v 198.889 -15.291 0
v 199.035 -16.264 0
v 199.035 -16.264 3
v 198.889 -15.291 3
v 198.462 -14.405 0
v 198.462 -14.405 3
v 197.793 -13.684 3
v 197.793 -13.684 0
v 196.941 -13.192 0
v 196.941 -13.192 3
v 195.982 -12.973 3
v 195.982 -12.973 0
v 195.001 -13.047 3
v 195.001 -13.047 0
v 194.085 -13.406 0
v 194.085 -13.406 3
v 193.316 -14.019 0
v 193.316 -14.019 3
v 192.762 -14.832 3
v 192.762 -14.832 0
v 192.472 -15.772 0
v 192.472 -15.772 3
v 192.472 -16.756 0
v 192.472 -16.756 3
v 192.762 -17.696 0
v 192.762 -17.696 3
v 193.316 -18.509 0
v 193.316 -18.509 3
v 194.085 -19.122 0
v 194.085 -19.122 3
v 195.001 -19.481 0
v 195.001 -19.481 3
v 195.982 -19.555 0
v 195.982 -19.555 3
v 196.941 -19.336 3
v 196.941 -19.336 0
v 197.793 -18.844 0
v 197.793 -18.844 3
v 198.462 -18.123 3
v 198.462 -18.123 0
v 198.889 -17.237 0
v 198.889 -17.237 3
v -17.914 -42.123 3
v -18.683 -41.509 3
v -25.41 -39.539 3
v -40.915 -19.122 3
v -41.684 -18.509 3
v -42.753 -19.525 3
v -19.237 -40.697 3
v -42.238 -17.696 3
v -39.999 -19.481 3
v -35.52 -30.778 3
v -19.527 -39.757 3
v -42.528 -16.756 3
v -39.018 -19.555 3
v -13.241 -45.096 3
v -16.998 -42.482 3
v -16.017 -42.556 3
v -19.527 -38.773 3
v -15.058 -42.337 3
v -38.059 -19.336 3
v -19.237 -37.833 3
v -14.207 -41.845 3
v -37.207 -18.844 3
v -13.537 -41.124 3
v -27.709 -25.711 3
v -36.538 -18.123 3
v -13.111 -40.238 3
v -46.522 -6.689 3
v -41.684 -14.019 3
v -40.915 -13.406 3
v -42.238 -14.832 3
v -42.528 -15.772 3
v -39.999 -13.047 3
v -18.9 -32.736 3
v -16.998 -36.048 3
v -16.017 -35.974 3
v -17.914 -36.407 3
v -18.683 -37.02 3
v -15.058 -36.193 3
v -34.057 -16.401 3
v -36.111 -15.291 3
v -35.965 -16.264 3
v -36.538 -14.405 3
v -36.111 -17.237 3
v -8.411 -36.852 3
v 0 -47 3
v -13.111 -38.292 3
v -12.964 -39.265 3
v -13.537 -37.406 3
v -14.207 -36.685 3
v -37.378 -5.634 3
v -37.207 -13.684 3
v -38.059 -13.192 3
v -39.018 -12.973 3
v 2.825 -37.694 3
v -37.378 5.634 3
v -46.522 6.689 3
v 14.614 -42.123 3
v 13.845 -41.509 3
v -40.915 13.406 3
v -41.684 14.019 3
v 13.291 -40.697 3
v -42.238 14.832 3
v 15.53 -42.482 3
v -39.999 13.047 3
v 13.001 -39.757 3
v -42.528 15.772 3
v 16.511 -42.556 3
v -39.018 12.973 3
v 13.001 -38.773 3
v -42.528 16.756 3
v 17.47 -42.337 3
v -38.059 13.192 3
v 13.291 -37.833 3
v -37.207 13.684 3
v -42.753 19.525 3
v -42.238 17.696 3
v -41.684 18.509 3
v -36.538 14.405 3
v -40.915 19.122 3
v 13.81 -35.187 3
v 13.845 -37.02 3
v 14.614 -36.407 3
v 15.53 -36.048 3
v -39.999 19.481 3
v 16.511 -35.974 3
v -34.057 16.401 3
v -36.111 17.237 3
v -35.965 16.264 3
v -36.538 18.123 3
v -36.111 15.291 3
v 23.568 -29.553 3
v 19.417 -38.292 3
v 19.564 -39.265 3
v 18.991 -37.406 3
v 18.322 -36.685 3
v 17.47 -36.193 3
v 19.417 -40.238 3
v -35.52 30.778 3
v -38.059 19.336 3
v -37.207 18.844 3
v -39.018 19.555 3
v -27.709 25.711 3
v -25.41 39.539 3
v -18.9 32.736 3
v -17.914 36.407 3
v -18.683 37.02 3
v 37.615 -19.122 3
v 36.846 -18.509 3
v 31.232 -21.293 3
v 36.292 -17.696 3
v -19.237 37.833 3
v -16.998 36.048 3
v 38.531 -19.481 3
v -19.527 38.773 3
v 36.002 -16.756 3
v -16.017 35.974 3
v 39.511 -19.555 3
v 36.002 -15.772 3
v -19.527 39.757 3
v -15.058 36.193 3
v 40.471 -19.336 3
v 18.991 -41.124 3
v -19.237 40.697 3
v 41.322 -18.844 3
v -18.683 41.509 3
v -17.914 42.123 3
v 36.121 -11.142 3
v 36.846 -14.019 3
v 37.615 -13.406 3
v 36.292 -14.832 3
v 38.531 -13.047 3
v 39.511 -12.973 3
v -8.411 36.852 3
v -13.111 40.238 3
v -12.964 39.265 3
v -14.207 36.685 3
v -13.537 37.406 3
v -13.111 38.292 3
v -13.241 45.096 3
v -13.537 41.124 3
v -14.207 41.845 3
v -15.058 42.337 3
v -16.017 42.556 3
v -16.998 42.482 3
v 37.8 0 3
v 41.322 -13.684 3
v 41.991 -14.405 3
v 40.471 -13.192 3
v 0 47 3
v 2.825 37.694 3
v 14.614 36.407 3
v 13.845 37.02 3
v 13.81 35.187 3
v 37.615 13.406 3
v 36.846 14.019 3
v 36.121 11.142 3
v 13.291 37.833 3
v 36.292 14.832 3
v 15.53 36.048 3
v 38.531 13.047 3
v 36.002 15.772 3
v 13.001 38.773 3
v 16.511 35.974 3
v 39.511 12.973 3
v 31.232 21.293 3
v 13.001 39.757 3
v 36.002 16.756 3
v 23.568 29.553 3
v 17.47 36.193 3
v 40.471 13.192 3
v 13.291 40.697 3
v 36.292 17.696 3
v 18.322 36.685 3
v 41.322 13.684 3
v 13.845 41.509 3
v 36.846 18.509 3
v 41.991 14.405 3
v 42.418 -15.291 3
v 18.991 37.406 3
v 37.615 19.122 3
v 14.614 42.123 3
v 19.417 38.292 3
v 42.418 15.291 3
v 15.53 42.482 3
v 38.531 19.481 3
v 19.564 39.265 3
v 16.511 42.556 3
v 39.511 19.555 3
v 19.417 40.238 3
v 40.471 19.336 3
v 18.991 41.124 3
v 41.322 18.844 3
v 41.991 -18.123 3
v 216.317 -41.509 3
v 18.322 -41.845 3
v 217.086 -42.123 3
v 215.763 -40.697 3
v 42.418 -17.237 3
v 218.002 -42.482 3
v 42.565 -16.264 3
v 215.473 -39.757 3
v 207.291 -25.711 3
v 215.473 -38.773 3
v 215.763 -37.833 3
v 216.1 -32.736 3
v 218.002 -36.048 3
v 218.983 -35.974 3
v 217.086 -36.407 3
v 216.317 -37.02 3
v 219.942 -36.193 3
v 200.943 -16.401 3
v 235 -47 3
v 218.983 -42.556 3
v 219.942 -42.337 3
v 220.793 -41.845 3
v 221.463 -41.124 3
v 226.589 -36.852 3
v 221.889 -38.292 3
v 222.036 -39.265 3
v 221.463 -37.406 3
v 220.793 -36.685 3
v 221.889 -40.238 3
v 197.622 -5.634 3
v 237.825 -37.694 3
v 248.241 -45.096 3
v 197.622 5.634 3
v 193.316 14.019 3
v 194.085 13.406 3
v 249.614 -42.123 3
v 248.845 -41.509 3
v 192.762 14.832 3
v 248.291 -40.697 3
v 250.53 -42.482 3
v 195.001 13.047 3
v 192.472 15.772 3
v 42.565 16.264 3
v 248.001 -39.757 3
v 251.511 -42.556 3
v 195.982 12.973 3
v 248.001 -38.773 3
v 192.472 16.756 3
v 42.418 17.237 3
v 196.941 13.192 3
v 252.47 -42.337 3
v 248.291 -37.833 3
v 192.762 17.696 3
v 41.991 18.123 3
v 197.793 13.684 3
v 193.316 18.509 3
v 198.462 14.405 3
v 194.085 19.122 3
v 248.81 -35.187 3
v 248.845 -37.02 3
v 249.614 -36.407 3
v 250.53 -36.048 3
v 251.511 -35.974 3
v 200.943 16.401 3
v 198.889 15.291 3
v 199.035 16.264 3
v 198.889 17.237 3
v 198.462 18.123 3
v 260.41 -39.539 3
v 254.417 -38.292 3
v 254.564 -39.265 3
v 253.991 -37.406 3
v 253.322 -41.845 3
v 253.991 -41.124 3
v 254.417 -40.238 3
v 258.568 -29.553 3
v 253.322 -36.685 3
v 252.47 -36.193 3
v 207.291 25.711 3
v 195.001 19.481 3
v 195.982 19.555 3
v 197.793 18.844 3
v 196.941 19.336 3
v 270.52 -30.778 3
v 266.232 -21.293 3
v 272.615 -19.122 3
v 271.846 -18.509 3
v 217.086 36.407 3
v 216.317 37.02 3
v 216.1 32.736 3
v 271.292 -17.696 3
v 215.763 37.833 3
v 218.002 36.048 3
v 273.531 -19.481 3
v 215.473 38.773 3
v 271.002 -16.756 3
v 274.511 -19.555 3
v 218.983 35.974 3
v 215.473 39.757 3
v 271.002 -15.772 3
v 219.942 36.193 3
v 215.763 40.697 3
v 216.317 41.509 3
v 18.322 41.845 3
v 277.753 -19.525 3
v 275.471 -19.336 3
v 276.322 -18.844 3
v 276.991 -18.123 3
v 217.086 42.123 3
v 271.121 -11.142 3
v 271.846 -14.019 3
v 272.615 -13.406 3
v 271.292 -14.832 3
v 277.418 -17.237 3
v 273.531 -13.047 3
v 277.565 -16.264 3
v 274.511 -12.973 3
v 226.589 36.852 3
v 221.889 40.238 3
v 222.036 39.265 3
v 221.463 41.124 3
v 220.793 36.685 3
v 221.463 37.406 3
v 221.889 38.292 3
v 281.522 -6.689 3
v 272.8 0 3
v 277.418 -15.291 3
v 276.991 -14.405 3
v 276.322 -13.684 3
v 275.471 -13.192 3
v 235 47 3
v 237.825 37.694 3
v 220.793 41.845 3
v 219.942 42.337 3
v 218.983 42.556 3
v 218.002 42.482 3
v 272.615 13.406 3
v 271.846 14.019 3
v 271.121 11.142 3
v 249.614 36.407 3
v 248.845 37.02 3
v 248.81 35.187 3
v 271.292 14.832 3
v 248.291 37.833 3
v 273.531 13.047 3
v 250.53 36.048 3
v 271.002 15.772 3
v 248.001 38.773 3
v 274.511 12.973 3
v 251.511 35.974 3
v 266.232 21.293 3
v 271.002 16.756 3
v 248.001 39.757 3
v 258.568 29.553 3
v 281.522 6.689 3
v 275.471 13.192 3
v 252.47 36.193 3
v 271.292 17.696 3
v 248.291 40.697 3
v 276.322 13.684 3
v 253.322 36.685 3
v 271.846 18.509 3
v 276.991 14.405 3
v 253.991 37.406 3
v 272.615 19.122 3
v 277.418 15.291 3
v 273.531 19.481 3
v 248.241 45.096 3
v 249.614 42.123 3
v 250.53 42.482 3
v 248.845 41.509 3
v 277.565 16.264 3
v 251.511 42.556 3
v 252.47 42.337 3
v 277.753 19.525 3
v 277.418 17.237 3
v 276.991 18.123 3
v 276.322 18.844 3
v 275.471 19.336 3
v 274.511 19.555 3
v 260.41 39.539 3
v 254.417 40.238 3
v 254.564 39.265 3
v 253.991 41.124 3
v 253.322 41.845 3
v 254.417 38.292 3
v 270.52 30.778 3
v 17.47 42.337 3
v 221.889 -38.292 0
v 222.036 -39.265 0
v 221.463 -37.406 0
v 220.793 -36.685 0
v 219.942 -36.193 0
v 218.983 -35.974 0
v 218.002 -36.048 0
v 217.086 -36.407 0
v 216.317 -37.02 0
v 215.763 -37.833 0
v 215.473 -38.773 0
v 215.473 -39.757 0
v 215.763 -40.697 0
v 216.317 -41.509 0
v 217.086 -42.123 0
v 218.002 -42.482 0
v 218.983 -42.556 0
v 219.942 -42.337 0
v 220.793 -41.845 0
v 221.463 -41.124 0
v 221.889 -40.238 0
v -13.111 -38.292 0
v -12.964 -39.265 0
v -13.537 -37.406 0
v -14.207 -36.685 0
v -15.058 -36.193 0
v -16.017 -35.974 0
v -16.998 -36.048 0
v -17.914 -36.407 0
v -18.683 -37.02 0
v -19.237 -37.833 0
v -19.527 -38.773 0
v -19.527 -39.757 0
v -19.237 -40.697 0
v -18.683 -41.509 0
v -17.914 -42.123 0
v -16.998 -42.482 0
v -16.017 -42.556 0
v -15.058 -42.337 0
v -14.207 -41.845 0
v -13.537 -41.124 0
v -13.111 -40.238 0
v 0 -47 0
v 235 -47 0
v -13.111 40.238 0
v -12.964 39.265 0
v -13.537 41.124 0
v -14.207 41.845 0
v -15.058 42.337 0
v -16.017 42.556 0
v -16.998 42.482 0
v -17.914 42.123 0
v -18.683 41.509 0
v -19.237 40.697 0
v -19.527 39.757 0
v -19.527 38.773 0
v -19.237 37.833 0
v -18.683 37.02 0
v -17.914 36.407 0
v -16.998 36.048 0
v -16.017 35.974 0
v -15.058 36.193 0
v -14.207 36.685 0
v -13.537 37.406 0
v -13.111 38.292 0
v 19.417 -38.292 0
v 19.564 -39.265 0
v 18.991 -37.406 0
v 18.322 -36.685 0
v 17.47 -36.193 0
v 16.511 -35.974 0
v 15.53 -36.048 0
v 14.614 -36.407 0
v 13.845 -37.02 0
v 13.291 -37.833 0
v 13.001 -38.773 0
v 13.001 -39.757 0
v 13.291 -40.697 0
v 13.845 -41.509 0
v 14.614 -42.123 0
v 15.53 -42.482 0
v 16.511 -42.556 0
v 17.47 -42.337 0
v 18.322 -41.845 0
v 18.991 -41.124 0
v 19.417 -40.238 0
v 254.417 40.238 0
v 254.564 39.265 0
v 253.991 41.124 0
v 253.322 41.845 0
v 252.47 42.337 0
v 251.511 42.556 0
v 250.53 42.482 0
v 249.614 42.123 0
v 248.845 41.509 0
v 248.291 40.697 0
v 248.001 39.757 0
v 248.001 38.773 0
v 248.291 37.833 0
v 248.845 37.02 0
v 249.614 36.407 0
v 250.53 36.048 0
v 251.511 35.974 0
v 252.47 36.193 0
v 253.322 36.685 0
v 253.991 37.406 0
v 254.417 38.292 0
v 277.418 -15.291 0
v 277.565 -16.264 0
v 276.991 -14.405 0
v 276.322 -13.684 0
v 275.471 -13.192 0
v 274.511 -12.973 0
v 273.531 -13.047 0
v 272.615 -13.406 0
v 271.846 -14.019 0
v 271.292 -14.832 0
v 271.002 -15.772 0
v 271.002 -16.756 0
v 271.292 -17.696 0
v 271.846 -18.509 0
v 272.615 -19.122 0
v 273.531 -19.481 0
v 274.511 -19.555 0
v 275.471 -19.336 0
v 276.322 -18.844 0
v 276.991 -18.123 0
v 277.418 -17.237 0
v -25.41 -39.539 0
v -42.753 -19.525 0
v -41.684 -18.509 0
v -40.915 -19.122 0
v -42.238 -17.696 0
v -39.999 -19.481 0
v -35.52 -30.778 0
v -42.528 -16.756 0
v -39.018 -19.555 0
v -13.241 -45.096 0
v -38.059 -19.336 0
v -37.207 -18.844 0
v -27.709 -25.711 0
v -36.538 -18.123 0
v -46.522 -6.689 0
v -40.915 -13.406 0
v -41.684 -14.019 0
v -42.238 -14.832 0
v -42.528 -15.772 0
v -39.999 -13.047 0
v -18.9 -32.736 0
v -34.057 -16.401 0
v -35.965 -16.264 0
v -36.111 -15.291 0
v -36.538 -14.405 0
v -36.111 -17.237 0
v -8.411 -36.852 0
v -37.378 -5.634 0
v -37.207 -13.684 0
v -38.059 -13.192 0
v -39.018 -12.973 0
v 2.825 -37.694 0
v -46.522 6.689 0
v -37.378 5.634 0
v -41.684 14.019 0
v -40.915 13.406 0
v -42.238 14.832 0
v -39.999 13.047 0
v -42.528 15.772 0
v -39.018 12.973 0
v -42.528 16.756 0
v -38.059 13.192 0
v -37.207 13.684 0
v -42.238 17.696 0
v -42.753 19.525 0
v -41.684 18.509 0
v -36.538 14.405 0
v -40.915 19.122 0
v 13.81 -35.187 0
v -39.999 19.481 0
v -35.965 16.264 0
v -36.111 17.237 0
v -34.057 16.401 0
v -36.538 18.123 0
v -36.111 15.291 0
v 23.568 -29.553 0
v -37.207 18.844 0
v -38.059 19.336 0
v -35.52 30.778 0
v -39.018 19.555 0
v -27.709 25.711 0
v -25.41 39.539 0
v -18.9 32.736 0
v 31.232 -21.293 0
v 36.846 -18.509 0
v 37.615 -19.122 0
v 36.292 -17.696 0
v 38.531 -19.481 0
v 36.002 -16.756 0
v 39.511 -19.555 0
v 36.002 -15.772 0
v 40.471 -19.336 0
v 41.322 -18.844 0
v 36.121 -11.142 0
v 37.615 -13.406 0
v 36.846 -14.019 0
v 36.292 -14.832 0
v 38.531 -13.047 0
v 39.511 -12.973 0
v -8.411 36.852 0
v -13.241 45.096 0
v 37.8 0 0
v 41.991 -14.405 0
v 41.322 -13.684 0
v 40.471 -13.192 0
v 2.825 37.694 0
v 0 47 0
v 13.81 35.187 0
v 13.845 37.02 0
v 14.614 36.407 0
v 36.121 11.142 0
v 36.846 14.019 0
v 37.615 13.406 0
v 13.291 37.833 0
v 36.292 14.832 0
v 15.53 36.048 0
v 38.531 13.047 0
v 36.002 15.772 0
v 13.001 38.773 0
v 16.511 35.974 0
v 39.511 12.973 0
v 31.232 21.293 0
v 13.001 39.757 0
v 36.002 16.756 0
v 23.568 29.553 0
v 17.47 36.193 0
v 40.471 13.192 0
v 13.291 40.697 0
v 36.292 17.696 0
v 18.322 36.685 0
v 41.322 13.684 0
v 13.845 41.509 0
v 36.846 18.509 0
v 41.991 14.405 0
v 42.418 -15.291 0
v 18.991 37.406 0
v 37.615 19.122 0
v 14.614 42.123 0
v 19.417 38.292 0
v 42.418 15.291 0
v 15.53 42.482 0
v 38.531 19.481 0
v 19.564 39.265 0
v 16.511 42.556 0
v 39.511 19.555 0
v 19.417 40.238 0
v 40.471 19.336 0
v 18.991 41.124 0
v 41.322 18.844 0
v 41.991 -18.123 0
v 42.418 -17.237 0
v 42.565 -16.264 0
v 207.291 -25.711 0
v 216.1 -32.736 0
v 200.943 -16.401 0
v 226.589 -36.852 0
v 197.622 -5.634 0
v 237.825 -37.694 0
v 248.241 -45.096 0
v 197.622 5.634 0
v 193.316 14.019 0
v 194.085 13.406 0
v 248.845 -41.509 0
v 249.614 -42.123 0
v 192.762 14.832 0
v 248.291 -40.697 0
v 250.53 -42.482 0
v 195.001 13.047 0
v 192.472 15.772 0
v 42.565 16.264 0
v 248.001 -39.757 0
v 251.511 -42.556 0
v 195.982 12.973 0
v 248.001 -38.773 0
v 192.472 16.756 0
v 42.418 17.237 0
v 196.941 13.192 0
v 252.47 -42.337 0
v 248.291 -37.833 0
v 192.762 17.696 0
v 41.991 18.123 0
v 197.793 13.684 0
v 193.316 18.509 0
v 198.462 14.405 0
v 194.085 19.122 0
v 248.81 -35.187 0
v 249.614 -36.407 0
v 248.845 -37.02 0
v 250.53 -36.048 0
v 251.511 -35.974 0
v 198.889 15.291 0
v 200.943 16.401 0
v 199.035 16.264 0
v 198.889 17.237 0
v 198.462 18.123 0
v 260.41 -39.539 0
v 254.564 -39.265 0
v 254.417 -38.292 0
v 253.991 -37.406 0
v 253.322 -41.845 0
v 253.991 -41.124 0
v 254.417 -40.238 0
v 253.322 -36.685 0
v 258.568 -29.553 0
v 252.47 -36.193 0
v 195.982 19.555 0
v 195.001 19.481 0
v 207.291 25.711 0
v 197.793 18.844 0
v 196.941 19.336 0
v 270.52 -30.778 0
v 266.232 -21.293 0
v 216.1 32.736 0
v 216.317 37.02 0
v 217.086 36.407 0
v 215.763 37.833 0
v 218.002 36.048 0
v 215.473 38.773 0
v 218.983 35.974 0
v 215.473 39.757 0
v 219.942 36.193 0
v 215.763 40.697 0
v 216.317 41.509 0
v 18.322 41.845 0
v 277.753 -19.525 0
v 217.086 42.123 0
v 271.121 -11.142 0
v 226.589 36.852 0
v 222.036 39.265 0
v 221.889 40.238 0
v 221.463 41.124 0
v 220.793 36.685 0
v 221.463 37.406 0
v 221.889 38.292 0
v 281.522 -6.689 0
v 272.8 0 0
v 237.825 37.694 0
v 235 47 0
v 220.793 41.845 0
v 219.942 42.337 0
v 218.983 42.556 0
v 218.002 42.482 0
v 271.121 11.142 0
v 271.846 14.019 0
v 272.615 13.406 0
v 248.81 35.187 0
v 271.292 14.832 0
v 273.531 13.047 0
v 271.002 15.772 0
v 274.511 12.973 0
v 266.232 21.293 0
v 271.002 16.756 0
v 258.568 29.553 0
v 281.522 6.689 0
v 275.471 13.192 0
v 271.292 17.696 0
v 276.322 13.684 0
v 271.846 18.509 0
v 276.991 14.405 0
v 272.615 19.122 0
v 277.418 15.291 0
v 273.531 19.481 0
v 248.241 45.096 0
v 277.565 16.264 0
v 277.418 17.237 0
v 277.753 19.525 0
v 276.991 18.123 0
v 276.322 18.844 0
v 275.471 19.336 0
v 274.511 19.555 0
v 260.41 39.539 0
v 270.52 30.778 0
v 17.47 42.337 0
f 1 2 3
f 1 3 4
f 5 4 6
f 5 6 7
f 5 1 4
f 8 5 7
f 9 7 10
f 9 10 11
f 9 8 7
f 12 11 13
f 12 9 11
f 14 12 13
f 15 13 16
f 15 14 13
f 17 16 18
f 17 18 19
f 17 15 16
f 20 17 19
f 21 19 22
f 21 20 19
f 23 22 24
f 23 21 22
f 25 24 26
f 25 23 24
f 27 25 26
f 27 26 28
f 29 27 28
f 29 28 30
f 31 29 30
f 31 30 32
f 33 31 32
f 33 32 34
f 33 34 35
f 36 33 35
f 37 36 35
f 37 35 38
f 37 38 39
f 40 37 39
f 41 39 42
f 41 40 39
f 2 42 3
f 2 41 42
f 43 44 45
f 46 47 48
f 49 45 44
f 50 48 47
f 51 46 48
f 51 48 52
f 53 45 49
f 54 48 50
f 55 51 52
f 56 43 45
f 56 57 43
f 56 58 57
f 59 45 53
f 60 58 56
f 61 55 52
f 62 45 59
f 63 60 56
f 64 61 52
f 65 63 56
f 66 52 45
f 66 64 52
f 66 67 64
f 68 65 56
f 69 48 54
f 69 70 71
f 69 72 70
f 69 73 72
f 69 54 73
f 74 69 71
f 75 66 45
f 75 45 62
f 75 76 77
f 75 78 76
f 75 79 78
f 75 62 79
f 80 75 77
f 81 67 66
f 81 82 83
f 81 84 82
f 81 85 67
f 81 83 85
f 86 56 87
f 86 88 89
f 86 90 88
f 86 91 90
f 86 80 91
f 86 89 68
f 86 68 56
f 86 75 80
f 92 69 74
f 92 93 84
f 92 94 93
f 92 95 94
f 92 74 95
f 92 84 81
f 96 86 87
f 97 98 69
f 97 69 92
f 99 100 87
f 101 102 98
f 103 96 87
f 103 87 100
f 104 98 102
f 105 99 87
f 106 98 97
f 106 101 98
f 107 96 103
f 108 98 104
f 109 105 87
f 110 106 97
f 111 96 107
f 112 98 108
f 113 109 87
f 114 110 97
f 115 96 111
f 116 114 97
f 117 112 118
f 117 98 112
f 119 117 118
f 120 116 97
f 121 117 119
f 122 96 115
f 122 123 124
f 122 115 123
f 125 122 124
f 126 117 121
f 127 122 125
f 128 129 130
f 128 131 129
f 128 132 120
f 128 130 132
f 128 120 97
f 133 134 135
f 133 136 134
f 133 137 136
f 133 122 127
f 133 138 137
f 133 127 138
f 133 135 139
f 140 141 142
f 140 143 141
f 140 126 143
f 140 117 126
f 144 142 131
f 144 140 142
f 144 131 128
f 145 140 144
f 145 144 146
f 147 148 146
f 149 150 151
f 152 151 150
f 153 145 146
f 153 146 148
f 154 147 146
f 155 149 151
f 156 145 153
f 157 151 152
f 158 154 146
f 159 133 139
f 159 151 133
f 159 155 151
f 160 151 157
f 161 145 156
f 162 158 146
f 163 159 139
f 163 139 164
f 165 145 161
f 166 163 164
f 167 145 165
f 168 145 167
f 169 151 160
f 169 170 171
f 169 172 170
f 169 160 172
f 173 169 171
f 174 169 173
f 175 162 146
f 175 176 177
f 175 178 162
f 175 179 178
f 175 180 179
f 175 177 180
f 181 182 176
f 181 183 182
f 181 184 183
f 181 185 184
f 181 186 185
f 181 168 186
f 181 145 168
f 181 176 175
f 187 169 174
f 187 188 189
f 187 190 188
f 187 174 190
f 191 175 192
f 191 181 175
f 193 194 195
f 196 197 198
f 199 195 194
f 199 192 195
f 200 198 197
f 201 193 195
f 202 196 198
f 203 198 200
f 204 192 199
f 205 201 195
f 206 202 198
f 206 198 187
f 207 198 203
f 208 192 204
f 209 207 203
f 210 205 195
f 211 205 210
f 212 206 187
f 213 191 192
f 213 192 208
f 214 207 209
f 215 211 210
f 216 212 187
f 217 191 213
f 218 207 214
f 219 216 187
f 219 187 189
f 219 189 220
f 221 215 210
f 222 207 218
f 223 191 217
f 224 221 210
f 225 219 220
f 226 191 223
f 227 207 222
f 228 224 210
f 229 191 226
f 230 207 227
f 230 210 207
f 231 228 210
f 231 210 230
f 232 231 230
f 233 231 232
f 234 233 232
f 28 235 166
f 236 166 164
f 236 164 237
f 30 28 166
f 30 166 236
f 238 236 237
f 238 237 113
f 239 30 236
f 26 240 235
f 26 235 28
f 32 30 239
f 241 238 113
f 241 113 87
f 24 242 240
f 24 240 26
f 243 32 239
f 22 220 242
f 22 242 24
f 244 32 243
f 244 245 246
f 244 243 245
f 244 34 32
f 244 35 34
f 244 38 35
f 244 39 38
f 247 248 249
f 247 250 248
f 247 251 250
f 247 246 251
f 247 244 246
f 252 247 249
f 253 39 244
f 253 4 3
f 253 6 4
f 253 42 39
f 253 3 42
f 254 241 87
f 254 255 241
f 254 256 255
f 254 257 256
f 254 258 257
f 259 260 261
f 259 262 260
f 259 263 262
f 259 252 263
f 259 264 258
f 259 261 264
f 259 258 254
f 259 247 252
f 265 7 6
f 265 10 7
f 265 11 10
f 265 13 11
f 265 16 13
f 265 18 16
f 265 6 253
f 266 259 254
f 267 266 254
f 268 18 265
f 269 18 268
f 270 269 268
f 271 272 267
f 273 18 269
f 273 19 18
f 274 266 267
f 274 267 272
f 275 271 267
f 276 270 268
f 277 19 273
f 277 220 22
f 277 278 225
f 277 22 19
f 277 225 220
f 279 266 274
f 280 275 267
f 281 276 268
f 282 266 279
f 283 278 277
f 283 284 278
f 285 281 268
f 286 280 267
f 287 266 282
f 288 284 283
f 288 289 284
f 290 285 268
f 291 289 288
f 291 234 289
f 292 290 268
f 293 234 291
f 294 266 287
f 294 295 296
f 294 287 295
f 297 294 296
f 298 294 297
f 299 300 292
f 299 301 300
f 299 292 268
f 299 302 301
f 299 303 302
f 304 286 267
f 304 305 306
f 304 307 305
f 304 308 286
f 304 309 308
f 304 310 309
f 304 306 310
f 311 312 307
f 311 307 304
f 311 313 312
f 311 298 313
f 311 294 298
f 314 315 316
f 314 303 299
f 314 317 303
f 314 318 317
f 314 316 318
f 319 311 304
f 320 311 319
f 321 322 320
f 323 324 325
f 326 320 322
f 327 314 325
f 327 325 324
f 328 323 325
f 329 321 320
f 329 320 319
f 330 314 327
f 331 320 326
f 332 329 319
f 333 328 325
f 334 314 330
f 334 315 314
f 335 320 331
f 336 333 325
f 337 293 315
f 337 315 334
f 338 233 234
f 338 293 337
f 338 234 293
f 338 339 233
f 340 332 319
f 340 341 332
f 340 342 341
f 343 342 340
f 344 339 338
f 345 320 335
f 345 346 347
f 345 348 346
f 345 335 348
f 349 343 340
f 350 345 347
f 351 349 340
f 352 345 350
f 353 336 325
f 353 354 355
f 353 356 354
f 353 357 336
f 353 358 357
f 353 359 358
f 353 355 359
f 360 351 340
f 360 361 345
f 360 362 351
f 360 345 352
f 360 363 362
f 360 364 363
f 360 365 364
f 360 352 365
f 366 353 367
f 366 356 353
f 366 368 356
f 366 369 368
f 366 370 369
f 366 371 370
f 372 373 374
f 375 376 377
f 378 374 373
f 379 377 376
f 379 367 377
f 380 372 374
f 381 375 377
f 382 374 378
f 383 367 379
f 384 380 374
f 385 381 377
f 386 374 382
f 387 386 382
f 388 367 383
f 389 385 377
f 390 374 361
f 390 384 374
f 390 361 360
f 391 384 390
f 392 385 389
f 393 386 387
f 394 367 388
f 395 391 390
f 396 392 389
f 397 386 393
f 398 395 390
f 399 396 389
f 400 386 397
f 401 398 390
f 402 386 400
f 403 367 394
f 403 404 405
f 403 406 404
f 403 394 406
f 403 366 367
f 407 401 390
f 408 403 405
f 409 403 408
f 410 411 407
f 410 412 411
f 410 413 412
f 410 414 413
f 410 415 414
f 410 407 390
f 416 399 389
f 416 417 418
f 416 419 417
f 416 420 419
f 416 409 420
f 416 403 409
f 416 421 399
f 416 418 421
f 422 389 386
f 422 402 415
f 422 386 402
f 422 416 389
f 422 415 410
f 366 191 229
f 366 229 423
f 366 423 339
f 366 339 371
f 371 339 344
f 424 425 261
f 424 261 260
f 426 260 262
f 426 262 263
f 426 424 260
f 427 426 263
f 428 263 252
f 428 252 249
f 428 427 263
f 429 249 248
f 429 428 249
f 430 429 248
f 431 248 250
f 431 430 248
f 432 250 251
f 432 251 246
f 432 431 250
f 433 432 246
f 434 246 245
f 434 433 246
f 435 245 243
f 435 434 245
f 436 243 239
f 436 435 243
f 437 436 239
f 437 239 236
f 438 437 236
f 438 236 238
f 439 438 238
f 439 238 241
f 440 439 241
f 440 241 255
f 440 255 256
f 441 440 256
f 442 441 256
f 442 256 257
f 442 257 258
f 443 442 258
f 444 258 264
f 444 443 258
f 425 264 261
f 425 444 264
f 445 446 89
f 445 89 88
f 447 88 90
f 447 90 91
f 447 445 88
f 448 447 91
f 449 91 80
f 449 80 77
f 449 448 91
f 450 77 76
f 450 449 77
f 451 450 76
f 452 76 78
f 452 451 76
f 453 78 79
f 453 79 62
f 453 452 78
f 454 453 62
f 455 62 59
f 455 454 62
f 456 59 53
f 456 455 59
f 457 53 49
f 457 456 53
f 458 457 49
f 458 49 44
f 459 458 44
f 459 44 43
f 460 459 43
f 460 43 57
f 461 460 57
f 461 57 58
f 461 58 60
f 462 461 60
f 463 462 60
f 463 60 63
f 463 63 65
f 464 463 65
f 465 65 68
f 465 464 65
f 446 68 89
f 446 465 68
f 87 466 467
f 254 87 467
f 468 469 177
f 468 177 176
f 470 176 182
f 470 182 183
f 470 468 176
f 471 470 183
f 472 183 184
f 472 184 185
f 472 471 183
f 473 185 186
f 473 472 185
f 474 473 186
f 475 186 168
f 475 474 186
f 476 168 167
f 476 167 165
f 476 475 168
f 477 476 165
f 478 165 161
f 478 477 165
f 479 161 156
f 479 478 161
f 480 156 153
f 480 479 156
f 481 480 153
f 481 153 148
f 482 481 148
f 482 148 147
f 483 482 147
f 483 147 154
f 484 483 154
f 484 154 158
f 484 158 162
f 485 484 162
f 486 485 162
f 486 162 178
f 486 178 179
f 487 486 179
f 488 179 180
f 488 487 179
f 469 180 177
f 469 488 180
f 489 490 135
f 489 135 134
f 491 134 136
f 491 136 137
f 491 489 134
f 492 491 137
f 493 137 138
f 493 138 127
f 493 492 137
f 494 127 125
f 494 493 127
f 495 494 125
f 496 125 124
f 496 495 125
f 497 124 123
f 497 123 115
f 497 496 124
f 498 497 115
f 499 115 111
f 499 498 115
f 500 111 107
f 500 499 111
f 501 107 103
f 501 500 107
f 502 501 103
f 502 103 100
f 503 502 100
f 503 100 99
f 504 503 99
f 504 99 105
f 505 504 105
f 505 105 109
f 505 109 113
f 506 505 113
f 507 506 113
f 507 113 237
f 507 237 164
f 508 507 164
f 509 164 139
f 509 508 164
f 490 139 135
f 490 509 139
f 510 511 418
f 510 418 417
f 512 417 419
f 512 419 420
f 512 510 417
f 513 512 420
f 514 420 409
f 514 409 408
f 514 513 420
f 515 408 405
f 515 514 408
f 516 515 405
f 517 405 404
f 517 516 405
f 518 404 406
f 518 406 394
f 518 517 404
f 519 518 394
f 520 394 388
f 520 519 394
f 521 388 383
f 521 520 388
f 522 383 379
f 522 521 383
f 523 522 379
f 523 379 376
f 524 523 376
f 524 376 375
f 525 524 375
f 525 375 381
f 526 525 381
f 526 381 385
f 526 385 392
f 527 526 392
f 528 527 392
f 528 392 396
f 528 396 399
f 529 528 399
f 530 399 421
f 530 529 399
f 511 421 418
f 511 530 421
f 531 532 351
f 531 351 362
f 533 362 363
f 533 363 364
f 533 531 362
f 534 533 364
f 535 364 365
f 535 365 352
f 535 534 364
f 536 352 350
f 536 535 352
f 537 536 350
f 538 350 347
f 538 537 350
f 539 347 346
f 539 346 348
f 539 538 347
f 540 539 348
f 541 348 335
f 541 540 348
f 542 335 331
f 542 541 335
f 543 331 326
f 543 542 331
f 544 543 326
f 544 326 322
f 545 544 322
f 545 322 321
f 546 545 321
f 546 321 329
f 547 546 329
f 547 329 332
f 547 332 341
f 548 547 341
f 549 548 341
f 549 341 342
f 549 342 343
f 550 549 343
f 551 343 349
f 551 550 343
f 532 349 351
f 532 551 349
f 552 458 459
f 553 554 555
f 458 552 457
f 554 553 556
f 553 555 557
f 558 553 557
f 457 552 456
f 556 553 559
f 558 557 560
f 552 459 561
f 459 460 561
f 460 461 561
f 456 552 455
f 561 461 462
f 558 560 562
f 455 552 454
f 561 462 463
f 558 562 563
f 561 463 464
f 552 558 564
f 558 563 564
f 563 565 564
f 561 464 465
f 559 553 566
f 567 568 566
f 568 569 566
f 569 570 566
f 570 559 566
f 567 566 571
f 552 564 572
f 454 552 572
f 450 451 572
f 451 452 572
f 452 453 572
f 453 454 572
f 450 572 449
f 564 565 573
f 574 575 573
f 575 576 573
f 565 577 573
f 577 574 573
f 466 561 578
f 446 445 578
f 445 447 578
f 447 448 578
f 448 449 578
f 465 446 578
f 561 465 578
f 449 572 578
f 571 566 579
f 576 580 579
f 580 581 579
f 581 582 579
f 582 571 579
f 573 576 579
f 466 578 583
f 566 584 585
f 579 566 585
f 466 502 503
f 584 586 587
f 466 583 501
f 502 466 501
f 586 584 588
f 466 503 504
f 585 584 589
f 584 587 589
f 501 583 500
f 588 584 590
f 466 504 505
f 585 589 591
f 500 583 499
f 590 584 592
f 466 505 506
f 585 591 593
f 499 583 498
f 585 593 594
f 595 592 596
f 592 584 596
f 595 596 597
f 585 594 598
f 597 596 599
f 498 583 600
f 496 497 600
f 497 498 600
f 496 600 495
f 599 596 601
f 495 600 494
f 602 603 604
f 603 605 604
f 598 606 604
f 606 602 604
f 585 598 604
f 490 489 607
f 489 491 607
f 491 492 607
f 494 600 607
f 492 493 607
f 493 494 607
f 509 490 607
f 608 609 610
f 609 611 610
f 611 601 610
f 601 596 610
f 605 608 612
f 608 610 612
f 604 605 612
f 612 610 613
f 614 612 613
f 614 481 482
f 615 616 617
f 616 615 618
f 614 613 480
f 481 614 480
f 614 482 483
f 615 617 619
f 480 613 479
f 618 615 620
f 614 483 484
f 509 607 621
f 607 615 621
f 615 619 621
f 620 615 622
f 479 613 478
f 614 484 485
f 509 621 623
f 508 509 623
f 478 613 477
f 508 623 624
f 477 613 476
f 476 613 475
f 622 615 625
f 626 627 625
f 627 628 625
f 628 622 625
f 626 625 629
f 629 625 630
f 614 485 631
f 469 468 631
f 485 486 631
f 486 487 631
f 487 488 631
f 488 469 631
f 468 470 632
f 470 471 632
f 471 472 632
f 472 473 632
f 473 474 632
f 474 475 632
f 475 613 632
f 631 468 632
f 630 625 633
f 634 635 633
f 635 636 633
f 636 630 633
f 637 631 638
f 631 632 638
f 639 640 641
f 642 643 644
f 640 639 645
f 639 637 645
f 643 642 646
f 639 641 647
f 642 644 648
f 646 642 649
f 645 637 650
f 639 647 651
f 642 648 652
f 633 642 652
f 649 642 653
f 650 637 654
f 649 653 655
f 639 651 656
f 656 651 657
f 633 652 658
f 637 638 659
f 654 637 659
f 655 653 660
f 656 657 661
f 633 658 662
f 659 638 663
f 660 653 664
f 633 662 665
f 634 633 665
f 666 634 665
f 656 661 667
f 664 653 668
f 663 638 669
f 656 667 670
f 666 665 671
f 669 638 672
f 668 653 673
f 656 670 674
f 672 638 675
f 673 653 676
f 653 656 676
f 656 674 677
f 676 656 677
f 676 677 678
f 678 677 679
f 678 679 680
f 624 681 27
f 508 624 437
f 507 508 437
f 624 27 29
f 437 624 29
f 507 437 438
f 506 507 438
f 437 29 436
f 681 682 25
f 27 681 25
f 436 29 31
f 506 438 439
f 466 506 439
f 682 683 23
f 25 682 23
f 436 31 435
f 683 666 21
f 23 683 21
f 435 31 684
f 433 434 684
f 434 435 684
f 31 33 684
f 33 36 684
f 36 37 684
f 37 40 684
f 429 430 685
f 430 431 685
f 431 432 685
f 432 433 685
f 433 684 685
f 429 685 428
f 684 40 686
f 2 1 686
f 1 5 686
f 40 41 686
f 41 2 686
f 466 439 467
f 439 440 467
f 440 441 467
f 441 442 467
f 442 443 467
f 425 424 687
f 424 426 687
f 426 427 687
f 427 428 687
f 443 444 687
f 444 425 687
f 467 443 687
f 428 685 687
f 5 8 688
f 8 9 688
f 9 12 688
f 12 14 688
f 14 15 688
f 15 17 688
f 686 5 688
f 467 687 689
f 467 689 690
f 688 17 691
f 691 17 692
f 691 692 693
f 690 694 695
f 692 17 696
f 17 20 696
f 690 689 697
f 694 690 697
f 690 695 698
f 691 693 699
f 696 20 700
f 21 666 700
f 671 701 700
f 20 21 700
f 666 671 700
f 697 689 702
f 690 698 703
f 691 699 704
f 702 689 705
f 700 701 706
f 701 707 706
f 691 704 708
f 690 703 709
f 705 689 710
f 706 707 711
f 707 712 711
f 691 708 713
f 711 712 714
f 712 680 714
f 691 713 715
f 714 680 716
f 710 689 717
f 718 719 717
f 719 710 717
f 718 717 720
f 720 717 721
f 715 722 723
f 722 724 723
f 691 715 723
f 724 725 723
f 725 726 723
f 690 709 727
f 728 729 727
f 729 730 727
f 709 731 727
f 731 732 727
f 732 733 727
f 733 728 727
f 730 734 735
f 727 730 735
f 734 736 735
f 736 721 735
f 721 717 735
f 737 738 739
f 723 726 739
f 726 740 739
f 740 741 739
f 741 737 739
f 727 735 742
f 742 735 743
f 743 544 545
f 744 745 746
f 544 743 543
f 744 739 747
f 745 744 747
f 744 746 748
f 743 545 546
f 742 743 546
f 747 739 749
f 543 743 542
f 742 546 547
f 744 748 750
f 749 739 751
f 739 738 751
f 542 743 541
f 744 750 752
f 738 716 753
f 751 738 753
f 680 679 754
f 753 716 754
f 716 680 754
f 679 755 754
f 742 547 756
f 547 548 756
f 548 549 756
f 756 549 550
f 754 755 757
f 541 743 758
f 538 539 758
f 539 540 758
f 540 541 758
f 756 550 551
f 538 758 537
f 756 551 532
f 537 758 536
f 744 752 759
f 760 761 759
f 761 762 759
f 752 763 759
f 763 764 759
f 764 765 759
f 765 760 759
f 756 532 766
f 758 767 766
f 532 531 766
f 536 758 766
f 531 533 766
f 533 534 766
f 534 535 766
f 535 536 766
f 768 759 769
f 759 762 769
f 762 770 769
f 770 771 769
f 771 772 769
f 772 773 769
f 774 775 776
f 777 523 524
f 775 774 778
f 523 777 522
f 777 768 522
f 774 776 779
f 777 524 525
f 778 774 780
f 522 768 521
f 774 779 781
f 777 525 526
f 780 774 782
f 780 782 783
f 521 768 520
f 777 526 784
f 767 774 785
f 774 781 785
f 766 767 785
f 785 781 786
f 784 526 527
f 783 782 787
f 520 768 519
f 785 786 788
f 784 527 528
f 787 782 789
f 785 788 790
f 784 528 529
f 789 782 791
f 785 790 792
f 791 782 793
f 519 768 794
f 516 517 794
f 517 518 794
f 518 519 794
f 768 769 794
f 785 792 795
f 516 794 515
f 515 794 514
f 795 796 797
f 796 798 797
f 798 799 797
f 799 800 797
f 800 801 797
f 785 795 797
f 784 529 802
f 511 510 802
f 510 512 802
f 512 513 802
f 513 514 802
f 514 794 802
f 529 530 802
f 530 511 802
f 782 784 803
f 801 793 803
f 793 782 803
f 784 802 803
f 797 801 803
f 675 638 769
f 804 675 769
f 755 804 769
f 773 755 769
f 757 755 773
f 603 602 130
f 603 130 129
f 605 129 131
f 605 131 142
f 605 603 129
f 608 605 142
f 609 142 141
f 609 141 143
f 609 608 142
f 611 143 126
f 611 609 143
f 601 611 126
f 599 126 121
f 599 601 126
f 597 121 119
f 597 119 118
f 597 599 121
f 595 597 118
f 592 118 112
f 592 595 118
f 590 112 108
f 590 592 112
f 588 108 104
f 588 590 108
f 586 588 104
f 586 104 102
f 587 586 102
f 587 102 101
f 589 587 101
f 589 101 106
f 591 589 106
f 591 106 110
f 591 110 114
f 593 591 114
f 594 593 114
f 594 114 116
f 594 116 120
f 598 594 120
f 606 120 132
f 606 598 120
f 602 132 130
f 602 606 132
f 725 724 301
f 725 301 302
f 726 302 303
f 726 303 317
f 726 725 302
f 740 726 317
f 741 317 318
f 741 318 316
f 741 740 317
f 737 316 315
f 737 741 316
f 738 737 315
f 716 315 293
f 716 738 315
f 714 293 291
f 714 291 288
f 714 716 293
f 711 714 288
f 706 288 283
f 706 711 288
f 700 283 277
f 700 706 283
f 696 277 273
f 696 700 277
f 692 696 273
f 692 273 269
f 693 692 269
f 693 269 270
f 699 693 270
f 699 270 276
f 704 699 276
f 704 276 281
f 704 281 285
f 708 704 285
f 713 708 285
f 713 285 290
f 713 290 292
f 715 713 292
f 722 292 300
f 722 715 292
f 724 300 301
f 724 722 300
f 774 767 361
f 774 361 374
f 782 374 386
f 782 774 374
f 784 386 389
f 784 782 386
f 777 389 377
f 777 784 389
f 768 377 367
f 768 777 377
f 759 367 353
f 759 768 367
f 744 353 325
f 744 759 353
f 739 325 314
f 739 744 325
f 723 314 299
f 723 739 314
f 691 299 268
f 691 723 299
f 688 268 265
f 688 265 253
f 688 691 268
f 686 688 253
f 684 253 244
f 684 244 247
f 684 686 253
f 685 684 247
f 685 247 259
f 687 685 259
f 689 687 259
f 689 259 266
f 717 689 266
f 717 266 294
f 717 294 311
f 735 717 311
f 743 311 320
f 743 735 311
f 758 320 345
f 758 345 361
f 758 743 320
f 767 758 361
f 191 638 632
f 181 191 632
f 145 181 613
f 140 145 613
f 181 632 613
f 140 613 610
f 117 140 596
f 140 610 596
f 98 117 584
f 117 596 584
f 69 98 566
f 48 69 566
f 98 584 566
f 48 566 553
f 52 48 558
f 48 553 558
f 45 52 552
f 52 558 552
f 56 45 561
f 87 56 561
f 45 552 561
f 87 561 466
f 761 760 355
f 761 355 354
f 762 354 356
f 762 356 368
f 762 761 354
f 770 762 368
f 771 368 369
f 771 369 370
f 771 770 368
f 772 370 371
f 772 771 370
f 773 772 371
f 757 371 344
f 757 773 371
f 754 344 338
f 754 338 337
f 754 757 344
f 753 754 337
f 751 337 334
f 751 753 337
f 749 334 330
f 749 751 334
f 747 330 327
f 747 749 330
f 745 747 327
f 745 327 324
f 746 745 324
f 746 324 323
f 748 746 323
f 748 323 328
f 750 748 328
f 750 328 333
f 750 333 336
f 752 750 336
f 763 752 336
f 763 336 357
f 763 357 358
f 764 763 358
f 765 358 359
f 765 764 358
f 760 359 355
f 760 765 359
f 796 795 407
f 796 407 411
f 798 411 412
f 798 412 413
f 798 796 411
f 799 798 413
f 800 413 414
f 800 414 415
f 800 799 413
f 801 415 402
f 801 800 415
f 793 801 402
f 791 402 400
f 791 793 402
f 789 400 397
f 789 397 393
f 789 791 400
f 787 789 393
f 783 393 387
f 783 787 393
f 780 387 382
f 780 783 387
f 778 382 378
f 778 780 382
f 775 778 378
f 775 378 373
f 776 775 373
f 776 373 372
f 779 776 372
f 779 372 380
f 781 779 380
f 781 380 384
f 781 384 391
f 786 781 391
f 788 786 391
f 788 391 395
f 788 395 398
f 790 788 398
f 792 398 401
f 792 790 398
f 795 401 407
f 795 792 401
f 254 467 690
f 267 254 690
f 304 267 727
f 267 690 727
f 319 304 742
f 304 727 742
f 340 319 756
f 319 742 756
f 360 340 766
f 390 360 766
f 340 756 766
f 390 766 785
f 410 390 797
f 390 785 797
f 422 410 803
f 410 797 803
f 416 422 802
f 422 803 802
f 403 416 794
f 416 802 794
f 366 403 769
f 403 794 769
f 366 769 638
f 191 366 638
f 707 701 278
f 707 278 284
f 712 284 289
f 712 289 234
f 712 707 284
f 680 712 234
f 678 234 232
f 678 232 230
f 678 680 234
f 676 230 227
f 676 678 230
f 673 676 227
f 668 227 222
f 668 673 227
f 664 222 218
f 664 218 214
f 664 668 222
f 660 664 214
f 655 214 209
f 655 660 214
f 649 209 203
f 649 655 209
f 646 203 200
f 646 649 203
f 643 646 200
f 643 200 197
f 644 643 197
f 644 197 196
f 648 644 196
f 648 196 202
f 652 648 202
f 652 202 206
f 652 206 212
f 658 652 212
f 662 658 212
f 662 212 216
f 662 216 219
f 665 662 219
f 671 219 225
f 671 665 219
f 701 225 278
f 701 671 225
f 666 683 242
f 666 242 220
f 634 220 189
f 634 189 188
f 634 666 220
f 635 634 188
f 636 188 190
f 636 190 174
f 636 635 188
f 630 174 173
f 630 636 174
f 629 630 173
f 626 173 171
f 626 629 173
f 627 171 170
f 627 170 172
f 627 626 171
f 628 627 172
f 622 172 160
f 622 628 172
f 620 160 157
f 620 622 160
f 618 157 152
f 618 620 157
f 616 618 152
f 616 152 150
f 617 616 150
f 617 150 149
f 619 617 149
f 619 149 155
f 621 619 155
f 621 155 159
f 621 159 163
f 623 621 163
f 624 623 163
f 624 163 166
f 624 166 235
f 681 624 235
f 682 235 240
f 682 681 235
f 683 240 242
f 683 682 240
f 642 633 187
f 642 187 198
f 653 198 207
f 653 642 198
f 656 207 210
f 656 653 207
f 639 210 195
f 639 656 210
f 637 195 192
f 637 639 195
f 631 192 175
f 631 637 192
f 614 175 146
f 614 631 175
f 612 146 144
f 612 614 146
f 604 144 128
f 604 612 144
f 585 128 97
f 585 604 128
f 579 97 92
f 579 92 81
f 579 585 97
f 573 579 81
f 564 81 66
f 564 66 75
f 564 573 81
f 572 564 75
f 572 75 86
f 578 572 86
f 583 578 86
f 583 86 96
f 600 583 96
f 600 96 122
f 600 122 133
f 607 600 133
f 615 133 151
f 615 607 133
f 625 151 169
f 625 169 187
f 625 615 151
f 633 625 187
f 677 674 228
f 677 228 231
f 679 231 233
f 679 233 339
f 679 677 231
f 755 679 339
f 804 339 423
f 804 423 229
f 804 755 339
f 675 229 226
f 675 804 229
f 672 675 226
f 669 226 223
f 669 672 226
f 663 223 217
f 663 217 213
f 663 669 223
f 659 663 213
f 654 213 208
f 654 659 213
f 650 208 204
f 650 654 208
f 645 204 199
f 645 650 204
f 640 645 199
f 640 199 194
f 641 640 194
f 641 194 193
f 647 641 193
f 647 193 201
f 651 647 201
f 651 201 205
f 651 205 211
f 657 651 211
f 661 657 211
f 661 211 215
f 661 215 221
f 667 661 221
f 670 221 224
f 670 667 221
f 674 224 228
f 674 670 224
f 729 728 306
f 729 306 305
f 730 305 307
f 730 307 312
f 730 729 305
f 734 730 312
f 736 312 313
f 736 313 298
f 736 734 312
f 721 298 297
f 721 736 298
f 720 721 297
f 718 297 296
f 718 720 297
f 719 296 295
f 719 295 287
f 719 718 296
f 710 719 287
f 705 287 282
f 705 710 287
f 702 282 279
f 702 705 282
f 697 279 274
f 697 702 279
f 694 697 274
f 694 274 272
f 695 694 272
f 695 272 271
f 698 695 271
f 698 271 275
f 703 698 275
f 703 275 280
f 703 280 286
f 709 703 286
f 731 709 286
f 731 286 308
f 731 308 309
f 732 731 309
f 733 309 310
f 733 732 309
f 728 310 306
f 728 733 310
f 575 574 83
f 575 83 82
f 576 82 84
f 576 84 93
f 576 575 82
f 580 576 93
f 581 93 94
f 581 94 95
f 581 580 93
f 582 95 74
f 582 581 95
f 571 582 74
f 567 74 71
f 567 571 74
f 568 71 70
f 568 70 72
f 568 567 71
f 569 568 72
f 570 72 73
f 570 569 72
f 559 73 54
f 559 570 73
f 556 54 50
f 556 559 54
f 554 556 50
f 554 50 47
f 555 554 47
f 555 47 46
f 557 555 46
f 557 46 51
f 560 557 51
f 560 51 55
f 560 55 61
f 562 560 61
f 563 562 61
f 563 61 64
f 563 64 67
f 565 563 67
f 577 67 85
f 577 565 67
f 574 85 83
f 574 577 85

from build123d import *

# Parameters (mm, degrees)
SKETCH_1_R      = 3.3
SKETCH_1_R_2    = 37.8
EXTRUDE_1_DEPTH = 3


with BuildPart() as part:
    # 草图1 → 凸台-拉伸1 (new body)
    with BuildSketch(Plane.XY):
        with BuildLine():
            Line((0, -47), (235, -47))
            ThreePointArc((235, -47), (282, 0), (235, 47))
            Line((235, 47), (0, 47))
            ThreePointArc((0, 47), (-47, 0), (0, -47))
        make_face()
        with Locations((16.264045876, -39.264880132)):
            Circle(SKETCH_1_R, mode=Mode.SUBTRACT)
        with Locations((39.264880132, -16.264045876)):
            Circle(SKETCH_1_R, mode=Mode.SUBTRACT)
        with Locations((39.264880132, 16.264045876)):
            Circle(SKETCH_1_R, mode=Mode.SUBTRACT)
        with Locations((16.264045876, 39.264880132)):
            Circle(SKETCH_1_R, mode=Mode.SUBTRACT)
        with Locations((-16.264045876, 39.264880132)):
            Circle(SKETCH_1_R, mode=Mode.SUBTRACT)
        with Locations((-39.264880132, 16.264045876)):
            Circle(SKETCH_1_R, mode=Mode.SUBTRACT)
        with Locations((-39.264880132, -16.264045876)):
            Circle(SKETCH_1_R, mode=Mode.SUBTRACT)
        with Locations((-16.264045876, -39.264880132)):
            Circle(SKETCH_1_R, mode=Mode.SUBTRACT)
        with Locations((251.264045876, -39.264880132)):
            Circle(SKETCH_1_R, mode=Mode.SUBTRACT)
        with Locations((274.264880132, -16.264045876)):
            Circle(SKETCH_1_R, mode=Mode.SUBTRACT)
        with Locations((274.264880132, 16.264045876)):
            Circle(SKETCH_1_R, mode=Mode.SUBTRACT)
        with Locations((251.264045876, 39.264880132)):
            Circle(SKETCH_1_R, mode=Mode.SUBTRACT)
        with Locations((218.735954124, 39.264880132)):
            Circle(SKETCH_1_R, mode=Mode.SUBTRACT)
        with Locations((195.735119868, 16.264045876)):
            Circle(SKETCH_1_R, mode=Mode.SUBTRACT)
        with Locations((195.735119868, -16.264045876)):
            Circle(SKETCH_1_R, mode=Mode.SUBTRACT)
        with Locations((218.735954124, -39.264880132)):
            Circle(SKETCH_1_R, mode=Mode.SUBTRACT)
        Circle(SKETCH_1_R_2, mode=Mode.SUBTRACT)
        with Locations((235, 0)):
            Circle(SKETCH_1_R_2, mode=Mode.SUBTRACT)
    extrude(amount=EXTRUDE_1_DEPTH)


solid = part.part
